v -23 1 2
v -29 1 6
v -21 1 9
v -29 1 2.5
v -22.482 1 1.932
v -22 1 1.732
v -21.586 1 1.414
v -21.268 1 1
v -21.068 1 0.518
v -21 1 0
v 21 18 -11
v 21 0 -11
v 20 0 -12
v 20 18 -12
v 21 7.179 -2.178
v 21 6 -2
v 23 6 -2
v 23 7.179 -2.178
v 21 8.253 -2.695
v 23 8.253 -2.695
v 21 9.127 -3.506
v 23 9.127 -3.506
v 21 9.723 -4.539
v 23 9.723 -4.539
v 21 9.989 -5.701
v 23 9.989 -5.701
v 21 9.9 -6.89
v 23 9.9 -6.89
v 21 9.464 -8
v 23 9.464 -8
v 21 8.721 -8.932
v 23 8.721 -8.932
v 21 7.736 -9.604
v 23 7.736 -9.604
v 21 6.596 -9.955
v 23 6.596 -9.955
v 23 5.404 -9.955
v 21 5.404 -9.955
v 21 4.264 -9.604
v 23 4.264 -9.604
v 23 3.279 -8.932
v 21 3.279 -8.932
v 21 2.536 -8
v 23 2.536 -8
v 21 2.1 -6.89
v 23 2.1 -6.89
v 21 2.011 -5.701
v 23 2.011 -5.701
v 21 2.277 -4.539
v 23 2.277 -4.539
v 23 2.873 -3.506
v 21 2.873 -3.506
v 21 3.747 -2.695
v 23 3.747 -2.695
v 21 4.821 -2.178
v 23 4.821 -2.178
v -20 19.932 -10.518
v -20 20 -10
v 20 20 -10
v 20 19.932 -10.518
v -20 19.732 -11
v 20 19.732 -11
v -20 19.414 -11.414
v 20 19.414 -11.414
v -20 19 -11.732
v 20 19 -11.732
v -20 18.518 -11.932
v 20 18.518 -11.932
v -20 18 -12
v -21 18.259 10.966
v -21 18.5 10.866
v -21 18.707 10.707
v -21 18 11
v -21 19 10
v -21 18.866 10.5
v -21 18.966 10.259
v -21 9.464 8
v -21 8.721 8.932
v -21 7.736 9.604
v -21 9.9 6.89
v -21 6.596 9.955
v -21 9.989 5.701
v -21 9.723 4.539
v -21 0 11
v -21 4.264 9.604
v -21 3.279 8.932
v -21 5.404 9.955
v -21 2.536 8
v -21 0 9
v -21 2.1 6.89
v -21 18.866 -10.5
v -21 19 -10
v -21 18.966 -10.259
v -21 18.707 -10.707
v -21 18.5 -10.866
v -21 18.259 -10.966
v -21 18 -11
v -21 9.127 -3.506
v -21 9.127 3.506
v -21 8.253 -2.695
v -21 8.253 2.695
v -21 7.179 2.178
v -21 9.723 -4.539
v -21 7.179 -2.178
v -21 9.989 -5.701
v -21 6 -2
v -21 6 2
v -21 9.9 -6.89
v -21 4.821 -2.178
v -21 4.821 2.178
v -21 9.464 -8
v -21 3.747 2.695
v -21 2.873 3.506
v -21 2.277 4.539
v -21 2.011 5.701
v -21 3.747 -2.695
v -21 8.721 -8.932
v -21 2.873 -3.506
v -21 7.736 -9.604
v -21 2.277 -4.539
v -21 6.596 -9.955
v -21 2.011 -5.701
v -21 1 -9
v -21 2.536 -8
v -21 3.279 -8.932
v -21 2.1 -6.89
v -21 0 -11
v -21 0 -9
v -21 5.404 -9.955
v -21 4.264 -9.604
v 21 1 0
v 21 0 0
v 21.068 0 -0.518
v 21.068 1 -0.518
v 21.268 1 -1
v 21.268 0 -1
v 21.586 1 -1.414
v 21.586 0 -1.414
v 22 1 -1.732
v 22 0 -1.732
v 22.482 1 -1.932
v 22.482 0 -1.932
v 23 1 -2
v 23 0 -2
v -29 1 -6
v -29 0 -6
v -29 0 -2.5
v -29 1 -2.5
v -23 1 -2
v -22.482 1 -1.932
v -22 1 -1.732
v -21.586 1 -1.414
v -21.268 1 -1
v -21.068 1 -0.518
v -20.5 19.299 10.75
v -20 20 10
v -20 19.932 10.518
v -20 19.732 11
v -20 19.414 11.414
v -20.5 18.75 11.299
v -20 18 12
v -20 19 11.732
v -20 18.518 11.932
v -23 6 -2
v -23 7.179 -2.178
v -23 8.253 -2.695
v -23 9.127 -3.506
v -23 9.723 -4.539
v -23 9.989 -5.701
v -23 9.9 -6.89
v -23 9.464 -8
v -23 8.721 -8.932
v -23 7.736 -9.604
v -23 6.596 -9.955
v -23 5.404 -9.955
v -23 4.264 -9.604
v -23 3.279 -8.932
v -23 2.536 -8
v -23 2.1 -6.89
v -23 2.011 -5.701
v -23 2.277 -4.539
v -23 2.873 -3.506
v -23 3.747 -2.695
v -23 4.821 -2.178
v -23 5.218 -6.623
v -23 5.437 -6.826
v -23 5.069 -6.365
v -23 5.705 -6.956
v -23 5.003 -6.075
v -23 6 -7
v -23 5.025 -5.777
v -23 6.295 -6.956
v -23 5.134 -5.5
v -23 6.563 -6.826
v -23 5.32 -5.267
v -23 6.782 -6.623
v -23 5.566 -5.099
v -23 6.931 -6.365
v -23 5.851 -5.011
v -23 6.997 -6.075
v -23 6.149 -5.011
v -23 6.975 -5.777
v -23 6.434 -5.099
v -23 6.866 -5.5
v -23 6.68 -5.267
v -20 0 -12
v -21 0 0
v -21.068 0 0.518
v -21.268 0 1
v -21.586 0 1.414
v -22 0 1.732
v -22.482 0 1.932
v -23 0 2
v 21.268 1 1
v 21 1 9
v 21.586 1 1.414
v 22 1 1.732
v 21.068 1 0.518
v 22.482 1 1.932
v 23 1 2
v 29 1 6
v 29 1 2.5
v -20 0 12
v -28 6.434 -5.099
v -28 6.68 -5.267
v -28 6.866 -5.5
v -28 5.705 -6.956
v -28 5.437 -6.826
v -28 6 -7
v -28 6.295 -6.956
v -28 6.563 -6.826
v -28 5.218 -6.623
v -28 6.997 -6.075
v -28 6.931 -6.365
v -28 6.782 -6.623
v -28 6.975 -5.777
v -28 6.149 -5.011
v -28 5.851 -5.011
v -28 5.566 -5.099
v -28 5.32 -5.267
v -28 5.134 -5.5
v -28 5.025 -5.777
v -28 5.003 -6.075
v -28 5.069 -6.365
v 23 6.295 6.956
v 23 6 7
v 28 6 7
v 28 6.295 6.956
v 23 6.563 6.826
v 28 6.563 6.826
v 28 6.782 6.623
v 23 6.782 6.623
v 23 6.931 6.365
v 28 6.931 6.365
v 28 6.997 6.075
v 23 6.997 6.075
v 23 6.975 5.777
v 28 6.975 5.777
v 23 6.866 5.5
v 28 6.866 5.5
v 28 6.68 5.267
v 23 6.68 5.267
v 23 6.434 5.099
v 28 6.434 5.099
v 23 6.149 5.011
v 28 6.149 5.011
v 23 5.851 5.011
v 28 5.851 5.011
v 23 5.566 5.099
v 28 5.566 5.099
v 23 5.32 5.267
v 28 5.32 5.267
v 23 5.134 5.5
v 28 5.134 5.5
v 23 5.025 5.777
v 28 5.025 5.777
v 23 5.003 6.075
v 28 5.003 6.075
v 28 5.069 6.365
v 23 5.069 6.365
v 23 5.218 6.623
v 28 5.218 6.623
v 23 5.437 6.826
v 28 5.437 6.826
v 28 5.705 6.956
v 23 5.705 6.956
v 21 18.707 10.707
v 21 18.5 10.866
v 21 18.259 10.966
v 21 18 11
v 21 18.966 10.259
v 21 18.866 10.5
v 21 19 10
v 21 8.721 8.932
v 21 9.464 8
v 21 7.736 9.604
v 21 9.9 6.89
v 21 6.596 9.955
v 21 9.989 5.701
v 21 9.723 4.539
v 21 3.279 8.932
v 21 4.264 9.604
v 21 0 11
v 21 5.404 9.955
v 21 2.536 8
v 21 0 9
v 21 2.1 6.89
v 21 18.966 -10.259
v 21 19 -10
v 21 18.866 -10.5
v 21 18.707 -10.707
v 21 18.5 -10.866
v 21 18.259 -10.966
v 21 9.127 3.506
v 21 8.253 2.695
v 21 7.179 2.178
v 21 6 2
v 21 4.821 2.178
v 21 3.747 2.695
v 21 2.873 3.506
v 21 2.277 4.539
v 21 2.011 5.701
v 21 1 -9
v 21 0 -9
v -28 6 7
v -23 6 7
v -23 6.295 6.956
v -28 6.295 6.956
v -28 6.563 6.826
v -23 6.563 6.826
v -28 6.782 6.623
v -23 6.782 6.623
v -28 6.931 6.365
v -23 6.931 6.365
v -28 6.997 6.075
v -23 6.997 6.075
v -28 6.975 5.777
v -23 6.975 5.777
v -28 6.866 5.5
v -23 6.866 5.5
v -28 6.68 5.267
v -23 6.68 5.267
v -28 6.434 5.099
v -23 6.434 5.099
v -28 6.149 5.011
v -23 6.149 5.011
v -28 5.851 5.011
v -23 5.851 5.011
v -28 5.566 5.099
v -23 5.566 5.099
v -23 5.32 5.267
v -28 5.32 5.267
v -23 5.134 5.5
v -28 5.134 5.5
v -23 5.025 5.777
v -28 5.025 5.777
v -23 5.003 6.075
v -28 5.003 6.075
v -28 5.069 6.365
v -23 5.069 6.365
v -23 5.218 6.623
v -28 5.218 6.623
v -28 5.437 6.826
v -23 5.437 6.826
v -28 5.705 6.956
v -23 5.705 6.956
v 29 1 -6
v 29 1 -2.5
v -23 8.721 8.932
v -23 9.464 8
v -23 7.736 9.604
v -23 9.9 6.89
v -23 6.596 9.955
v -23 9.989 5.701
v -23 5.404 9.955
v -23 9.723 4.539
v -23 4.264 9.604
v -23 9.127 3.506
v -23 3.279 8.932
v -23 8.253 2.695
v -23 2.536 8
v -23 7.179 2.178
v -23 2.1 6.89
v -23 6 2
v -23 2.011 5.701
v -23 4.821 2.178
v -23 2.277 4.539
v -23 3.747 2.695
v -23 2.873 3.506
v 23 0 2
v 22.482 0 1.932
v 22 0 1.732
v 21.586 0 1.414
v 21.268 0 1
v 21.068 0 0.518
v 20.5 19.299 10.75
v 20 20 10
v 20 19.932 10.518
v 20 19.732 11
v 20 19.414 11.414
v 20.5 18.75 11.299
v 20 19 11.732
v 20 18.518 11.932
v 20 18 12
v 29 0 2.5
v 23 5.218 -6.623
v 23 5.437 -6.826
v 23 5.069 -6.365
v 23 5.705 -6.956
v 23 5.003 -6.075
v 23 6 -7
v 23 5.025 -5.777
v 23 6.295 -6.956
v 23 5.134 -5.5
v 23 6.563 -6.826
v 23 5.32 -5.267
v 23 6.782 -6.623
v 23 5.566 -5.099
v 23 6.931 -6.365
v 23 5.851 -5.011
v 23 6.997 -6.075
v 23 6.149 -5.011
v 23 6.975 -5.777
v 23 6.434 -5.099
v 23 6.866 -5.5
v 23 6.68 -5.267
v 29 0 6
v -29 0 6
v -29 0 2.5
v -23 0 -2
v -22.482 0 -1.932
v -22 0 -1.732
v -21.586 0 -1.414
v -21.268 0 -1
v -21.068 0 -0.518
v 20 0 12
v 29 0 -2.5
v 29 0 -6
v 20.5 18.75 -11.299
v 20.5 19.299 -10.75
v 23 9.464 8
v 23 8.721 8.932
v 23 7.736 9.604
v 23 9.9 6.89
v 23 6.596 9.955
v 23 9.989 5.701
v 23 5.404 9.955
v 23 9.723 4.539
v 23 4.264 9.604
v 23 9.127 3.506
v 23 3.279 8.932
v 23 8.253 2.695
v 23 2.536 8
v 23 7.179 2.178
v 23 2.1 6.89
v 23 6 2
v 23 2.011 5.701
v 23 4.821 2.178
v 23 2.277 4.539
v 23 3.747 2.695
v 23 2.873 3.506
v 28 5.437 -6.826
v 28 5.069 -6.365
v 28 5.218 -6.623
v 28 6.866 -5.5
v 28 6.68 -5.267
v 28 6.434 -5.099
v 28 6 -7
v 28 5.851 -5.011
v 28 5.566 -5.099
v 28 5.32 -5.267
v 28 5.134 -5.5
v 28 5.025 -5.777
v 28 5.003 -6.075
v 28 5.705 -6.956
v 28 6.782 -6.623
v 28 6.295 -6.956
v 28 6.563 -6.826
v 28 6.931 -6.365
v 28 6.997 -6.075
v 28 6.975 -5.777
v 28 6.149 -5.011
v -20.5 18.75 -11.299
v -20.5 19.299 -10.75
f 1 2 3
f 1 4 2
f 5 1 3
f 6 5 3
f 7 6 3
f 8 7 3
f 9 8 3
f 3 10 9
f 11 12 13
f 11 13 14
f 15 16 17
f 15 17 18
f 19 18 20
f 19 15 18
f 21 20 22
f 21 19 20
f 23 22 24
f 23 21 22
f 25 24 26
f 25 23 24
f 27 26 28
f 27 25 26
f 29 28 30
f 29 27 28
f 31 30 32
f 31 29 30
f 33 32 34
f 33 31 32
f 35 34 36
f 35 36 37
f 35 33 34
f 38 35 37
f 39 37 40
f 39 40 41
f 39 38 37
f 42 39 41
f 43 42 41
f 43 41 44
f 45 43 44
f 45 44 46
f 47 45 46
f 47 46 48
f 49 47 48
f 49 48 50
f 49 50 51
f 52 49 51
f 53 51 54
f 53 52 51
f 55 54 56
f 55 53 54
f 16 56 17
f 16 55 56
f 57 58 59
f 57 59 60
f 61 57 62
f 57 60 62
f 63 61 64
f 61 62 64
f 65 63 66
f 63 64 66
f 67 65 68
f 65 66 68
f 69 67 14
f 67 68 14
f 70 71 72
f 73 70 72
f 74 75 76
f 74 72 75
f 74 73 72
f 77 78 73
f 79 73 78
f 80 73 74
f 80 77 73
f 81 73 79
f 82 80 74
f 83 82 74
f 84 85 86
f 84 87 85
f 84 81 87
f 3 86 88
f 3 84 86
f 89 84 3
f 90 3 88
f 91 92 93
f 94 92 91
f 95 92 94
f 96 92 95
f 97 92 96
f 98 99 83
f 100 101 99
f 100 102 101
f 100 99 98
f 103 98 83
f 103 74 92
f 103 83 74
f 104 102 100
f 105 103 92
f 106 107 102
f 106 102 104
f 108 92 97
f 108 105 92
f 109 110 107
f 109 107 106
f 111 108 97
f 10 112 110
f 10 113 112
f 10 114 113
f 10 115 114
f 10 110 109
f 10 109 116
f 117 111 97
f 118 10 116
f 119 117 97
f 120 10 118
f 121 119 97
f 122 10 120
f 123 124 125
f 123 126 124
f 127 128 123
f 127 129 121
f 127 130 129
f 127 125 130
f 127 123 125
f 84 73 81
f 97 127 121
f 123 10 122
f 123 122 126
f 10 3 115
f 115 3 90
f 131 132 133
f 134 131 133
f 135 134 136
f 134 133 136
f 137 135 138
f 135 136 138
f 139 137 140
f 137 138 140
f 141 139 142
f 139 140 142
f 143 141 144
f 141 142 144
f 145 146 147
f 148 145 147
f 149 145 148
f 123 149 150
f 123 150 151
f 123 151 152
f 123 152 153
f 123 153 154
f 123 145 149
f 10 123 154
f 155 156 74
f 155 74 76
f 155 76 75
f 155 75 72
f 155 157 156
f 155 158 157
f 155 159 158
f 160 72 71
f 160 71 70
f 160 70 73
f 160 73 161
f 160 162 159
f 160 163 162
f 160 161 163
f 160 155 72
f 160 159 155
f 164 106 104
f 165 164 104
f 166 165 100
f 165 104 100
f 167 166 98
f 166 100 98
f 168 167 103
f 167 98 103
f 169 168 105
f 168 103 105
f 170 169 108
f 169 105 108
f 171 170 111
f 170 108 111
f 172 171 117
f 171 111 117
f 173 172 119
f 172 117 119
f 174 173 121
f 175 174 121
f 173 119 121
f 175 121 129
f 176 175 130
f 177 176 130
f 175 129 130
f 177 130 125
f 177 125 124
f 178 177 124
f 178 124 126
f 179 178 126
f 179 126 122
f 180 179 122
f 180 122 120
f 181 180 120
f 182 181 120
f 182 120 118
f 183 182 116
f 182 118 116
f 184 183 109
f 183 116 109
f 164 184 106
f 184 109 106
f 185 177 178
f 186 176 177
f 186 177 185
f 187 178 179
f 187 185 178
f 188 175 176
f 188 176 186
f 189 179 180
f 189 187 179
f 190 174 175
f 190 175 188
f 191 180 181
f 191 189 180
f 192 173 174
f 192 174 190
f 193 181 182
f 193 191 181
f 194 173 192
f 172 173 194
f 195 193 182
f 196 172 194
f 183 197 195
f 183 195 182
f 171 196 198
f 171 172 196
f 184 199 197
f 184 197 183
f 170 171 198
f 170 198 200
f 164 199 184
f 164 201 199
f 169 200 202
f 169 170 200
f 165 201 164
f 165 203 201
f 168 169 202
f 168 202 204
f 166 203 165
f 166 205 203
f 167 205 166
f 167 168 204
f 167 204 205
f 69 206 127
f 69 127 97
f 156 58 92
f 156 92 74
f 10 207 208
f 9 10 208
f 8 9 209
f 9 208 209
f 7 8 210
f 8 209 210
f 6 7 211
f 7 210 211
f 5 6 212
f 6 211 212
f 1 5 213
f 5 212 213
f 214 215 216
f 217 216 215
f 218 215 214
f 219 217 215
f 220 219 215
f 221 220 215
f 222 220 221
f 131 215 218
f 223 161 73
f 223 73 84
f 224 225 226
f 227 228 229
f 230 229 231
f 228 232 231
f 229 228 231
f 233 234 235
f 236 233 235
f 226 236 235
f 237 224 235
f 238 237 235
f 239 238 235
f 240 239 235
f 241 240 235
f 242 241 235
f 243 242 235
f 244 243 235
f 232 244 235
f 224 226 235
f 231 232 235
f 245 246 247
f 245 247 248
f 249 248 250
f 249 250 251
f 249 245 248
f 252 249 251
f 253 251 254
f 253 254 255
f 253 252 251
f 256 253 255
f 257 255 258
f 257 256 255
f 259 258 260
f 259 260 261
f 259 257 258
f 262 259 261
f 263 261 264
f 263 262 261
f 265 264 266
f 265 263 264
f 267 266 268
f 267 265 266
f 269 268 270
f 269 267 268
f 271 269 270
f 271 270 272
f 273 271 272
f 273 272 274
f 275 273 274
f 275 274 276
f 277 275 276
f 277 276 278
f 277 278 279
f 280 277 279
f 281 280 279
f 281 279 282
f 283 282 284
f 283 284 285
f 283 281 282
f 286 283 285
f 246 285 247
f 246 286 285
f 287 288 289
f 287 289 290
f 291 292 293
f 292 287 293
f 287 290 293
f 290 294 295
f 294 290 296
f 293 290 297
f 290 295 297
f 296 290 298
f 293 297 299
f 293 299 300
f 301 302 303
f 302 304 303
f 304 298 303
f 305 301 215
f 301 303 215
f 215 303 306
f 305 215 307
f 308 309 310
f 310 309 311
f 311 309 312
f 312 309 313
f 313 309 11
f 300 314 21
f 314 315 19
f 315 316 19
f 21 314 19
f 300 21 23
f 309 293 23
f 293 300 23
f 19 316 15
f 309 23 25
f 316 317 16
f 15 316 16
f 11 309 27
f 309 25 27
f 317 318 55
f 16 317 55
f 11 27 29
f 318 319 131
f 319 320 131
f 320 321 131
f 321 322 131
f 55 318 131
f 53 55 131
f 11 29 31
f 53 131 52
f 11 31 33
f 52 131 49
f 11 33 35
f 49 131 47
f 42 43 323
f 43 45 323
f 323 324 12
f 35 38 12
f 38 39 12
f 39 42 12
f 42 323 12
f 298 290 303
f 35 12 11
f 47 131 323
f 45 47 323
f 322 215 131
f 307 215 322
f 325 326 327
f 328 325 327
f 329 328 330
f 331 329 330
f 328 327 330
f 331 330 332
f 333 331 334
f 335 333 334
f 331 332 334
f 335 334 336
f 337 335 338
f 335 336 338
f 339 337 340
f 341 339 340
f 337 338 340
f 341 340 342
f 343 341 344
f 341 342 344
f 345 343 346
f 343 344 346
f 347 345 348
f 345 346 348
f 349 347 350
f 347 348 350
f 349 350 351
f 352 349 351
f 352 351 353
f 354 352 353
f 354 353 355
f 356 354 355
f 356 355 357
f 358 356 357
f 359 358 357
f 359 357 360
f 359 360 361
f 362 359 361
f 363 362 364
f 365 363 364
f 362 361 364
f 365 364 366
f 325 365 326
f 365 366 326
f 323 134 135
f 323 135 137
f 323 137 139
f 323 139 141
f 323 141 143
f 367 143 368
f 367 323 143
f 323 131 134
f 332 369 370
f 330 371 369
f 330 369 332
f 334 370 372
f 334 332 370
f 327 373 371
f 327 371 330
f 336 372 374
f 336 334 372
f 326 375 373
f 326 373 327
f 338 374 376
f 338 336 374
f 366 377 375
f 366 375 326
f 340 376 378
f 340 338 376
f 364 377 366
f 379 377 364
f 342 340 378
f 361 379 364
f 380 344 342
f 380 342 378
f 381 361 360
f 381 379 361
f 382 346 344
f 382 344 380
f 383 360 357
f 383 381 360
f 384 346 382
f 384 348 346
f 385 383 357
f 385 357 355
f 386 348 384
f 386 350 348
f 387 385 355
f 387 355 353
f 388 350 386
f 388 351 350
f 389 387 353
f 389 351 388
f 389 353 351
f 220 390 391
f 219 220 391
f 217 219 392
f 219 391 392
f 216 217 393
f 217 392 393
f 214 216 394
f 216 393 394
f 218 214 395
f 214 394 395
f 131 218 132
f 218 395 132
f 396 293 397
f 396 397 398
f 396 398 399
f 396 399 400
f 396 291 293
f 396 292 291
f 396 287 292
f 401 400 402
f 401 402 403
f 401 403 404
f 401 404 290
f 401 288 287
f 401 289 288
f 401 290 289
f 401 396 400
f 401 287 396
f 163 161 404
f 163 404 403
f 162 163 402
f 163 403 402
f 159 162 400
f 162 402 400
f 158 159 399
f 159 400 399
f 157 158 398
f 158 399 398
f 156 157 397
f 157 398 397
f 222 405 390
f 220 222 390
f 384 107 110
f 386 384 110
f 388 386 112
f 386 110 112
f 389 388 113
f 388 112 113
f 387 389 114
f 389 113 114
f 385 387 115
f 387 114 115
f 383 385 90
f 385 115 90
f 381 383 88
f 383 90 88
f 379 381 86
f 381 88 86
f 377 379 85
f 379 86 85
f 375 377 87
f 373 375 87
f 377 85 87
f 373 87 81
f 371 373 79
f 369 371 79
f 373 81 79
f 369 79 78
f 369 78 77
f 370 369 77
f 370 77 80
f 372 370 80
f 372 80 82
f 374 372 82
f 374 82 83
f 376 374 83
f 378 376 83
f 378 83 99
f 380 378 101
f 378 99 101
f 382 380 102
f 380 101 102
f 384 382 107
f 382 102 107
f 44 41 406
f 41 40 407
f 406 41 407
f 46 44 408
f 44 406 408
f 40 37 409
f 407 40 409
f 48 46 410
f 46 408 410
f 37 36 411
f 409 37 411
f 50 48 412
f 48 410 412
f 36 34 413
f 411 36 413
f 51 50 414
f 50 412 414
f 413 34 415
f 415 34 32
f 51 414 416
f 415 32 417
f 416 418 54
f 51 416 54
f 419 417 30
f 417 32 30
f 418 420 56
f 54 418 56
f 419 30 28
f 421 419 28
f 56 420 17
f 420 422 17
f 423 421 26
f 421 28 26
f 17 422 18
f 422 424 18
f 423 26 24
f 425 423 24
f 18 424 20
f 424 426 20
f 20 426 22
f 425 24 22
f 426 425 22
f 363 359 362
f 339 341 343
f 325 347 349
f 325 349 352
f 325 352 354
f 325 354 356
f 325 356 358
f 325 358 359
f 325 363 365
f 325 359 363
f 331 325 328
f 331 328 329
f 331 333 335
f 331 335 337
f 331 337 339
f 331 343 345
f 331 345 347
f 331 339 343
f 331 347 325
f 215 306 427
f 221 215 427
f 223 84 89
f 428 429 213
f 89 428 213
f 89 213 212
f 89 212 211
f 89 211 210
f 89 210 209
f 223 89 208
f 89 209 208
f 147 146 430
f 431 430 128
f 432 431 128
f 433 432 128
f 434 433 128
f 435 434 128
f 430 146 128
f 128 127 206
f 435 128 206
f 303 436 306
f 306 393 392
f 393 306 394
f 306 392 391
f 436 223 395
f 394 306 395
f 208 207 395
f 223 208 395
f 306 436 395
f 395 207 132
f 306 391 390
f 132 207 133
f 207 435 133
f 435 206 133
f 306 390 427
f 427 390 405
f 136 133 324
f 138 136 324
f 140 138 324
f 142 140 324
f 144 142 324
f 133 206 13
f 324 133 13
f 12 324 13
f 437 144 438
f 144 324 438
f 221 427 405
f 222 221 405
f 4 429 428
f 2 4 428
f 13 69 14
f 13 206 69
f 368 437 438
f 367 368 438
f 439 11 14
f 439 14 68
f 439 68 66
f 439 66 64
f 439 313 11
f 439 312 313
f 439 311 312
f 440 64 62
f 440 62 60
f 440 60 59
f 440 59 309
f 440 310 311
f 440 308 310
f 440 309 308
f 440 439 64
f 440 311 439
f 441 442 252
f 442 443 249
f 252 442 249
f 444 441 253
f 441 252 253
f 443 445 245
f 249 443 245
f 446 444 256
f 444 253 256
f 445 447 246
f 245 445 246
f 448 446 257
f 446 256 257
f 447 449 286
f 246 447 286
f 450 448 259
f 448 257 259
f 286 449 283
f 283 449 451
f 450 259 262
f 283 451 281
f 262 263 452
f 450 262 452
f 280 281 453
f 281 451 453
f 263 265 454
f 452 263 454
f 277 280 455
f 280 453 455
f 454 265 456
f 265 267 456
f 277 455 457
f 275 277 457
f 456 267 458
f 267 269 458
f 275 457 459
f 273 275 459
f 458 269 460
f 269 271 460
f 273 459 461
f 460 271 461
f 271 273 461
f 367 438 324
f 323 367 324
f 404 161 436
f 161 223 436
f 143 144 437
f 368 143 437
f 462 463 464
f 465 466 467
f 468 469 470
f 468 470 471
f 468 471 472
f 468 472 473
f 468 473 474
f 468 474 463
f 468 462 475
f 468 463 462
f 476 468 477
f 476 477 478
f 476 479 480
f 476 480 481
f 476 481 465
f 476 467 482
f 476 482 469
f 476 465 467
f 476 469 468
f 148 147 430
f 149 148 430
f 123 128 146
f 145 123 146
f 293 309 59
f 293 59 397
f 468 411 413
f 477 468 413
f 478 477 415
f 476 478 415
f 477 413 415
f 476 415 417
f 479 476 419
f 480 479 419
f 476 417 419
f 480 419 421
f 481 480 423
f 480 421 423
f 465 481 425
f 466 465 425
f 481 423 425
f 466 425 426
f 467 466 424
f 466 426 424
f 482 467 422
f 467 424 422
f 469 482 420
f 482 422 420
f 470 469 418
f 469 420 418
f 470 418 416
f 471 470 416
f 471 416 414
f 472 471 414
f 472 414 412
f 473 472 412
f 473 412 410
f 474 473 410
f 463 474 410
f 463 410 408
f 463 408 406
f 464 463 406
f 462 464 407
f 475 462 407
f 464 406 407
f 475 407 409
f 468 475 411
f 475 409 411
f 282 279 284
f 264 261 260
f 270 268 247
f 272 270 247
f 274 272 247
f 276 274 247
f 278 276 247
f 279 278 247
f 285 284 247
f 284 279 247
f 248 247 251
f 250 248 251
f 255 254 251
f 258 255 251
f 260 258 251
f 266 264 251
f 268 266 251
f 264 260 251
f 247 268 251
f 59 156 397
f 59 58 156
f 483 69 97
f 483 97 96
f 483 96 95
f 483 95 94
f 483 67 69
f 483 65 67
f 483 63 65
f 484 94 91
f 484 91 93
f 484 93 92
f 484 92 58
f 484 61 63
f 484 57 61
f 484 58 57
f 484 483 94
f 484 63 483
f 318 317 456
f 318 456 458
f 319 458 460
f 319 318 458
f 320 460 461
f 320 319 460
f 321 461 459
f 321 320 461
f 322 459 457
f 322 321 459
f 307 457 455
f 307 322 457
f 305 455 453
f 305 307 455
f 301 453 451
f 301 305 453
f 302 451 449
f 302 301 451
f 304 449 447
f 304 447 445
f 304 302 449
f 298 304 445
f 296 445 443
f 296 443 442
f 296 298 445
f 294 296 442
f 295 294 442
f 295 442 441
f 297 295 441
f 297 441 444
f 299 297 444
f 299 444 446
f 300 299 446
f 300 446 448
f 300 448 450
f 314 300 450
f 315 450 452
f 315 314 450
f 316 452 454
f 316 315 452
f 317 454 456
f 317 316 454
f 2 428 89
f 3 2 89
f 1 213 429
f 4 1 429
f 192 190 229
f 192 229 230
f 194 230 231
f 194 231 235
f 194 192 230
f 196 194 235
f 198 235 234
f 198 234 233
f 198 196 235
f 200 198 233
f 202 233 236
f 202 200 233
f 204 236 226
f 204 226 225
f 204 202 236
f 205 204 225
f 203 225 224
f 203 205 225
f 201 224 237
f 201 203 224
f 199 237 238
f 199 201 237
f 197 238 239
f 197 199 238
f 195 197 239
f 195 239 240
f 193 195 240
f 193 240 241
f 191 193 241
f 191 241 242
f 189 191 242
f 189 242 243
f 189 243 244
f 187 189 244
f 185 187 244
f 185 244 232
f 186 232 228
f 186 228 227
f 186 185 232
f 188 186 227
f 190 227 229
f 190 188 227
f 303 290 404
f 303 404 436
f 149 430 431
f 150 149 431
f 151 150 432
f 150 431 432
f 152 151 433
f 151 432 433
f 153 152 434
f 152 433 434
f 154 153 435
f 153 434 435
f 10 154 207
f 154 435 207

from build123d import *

# Parameters (mm, degrees)
SKETCH_1_W               = 40
SKETCH_1_H               = 24
EXTRUDE_1_DEPTH          = 20
EXTRUDE_2_DEPTH          = 1
EXTRUDE_2_2_DEPTH        = 1
EXTRUDE_2_3_DEPTH        = 1
EXTRUDE_2_4_DEPTH        = 1
SKETCH_1_6_W             = 1
SKETCH_1_6_H             = 24
EXTRUDE_4_DEPTH          = 20
SKETCH_2_R               = 4
EXTRUDE_5_DEPTH          = 2
FILLET_1_R               = 2
CHAMFER_1_SIZE           = 1
CHAMFER_2_SIZE           = 1
SKETCH_3_R               = 1
EXTRUDE_6_DEPTH          = 5
MIRROR_4_COPY_1_SKETCH_R = 1
MIRROR_4_COPY_1_DEPTH    = 5
MIRROR_4_COPY_2_SKETCH_R = 1
MIRROR_4_COPY_2_DEPTH    = 5


with BuildPart() as part:
    # 草图1 → 凸台-拉伸1 (new body)
    with BuildSketch(Plane(origin=(0, 0, 0), x_dir=(1, 0, 0), z_dir=(0, 1, 0))):
        Rectangle(SKETCH_1_W, SKETCH_1_H)
    extrude(amount=EXTRUDE_1_DEPTH)



with BuildPart() as body_2:
    # 草图1<4> → 凸台-拉伸2 (new body)
    with BuildSketch(Plane(origin=(0, 0, 0), x_dir=(1, 0, 0), z_dir=(0, 1, 0))):
        with BuildLine():
            Line((-21, 0), (-21, 9))
            Line((-21, 9), (-29, 6))
            Line((-29, 6), (-29, 2.5))
            Line((-29, 2.5), (-23, 2))
            ThreePointArc((-23, 2), (-21.585786438, 1.414213562), (-21, 0))
        make_face()
    extrude(amount=EXTRUDE_2_DEPTH)


with BuildPart() as body_3:
    # 草图1<4> → Extrude 2 2 (new body)
    with BuildSketch(Plane(origin=(0, 0, 0), x_dir=(1, 0, 0), z_dir=(0, 1, 0))):
        with BuildLine():
            Line((29, 6), (21, 9))
            Line((21, 9), (21, 0))
            ThreePointArc((21, 0), (21.585786438, 1.414213562), (23, 2))
            Line((23, 2), (29, 2.5))
            Line((29, 2.5), (29, 6))
        make_face()
    extrude(amount=EXTRUDE_2_2_DEPTH)


with BuildPart() as body_4:
    # 草图1<4> → Extrude 2 3 (new body)
    with BuildSketch(Plane(origin=(0, 0, 0), x_dir=(1, 0, 0), z_dir=(0, 1, 0))):
        with BuildLine():
            Line((-29, -6), (-21, -9))
            Line((-21, -9), (-21, 0))
            ThreePointArc((-21, 0), (-21.585786438, -1.414213562), (-23, -2))
            Line((-23, -2), (-29, -2.5))
            Line((-29, -2.5), (-29, -6))
        make_face()
    extrude(amount=EXTRUDE_2_3_DEPTH)


with BuildPart() as body_5:
    # 草图1<4> → Extrude 2 4 (new body)
    with BuildSketch(Plane(origin=(0, 0, 0), x_dir=(1, 0, 0), z_dir=(0, 1, 0))):
        with BuildLine():
            Line((21, 0), (21, -9))
            Line((21, -9), (29, -6))
            Line((29, -6), (29, -2.5))
            Line((29, -2.5), (23, -2))
            ThreePointArc((23, -2), (21.585786438, -1.414213562), (21, 0))
        make_face()
    extrude(amount=EXTRUDE_2_4_DEPTH)


with BuildPart() as part_1:
    add(part.part)

    add(body_2.part)  # 凸台-拉伸4 merges body 2

    add(body_3.part)  # 凸台-拉伸4 merges body 3

    add(body_4.part)  # 凸台-拉伸4 merges body 4

    add(body_5.part)  # 凸台-拉伸4 merges body 5
    # 草图1<6> → 凸台-拉伸4 (add)
    with BuildSketch(Plane(origin=(0, 0, 0), x_dir=(1, 0, 0), z_dir=(0, 1, 0))):
        with Locations((-20.5, 0)):
            Rectangle(SKETCH_1_6_W, SKETCH_1_6_H)
        with Locations((20.5, 0)):
            Rectangle(SKETCH_1_6_W, SKETCH_1_6_H)
    extrude(amount=EXTRUDE_4_DEPTH)

    # 草图2 → 凸台-拉伸5 (add)
    with BuildSketch(Plane.ZY.offset(21)):
        with Locations((6, 6)):
            Circle(SKETCH_2_R)
        with Locations((-6, 6)):
            Circle(SKETCH_2_R)
    extrude_5 = extrude(amount=EXTRUDE_5_DEPTH)

    # 镜向1: 凸台-拉伸5 across plane
    add(extrude_5.mirror(Plane(origin=(0, 0, 0), x_dir=(0, 0, 1), z_dir=(1, 0, 0))))

    # 圆角1
    fillet_1_edges = [part_1.edges().sort_by_distance(p)[0] for p in [
        (0, 20, -12),
        (0, 20, 12),
    ]]
    fillet(fillet_1_edges, radius=FILLET_1_R)

    # 倒角1
    chamfer_1_edges = [part_1.edges().sort_by_distance(p)[0] for p in [
        (21, 9, -12),
        (21, 9, 12),
        (21, 19.414213562, -11.414213562),
        (21, 19.414213562, 11.414213562),
        (21, 20, 0),
    ]]
    chamfer(chamfer_1_edges, length=CHAMFER_1_SIZE)

    # 倒角2
    chamfer_2_edges = [part_1.edges().sort_by_distance(p)[0] for p in [
        (-21, 9, -12),
        (-21, 9, 12),
        (-21, 19.414213562, -11.414213562),
        (-21, 19.414213562, 11.414213562),
        (-21, 20, 0),
    ]]
    chamfer(chamfer_2_edges, length=CHAMFER_2_SIZE)

    # 草图3 → 凸台-拉伸6 (add)
    with BuildSketch(Plane.ZY.offset(23)):
        with Locations((6, 6)):
            Circle(SKETCH_3_R)
    extrude_6 = extrude(amount=EXTRUDE_6_DEPTH)

    # 镜向2: 凸台-拉伸6 across plane
    add(extrude_6.mirror(Plane.XY))

    # 镜向3: 凸台-拉伸6 across plane
    add(extrude_6.mirror(Plane(origin=(0, 0, 0), x_dir=(0, 0, 1), z_dir=(1, 0, 0))))

    # 镜向4 copy 1 sketch → 镜向4 copy 1 (add)
    with BuildSketch(Plane(origin=(23, 0, 0), x_dir=(0, 0, -1), z_dir=(1, 0, 0))):
        with Locations((6, 6)):
            Circle(MIRROR_4_COPY_1_SKETCH_R)
    extrude(amount=MIRROR_4_COPY_1_DEPTH)

    # 镜向4 copy 2 sketch → 镜向4 copy 2 (add)
    with BuildSketch(Plane(origin=(23, 0, 0), x_dir=(0, 0, 1), z_dir=(1, 0, 0))):
        with Locations((6, -6)):
            Circle(MIRROR_4_COPY_2_SKETCH_R)
    extrude(amount=MIRROR_4_COPY_2_DEPTH)


solid = part_1.part
